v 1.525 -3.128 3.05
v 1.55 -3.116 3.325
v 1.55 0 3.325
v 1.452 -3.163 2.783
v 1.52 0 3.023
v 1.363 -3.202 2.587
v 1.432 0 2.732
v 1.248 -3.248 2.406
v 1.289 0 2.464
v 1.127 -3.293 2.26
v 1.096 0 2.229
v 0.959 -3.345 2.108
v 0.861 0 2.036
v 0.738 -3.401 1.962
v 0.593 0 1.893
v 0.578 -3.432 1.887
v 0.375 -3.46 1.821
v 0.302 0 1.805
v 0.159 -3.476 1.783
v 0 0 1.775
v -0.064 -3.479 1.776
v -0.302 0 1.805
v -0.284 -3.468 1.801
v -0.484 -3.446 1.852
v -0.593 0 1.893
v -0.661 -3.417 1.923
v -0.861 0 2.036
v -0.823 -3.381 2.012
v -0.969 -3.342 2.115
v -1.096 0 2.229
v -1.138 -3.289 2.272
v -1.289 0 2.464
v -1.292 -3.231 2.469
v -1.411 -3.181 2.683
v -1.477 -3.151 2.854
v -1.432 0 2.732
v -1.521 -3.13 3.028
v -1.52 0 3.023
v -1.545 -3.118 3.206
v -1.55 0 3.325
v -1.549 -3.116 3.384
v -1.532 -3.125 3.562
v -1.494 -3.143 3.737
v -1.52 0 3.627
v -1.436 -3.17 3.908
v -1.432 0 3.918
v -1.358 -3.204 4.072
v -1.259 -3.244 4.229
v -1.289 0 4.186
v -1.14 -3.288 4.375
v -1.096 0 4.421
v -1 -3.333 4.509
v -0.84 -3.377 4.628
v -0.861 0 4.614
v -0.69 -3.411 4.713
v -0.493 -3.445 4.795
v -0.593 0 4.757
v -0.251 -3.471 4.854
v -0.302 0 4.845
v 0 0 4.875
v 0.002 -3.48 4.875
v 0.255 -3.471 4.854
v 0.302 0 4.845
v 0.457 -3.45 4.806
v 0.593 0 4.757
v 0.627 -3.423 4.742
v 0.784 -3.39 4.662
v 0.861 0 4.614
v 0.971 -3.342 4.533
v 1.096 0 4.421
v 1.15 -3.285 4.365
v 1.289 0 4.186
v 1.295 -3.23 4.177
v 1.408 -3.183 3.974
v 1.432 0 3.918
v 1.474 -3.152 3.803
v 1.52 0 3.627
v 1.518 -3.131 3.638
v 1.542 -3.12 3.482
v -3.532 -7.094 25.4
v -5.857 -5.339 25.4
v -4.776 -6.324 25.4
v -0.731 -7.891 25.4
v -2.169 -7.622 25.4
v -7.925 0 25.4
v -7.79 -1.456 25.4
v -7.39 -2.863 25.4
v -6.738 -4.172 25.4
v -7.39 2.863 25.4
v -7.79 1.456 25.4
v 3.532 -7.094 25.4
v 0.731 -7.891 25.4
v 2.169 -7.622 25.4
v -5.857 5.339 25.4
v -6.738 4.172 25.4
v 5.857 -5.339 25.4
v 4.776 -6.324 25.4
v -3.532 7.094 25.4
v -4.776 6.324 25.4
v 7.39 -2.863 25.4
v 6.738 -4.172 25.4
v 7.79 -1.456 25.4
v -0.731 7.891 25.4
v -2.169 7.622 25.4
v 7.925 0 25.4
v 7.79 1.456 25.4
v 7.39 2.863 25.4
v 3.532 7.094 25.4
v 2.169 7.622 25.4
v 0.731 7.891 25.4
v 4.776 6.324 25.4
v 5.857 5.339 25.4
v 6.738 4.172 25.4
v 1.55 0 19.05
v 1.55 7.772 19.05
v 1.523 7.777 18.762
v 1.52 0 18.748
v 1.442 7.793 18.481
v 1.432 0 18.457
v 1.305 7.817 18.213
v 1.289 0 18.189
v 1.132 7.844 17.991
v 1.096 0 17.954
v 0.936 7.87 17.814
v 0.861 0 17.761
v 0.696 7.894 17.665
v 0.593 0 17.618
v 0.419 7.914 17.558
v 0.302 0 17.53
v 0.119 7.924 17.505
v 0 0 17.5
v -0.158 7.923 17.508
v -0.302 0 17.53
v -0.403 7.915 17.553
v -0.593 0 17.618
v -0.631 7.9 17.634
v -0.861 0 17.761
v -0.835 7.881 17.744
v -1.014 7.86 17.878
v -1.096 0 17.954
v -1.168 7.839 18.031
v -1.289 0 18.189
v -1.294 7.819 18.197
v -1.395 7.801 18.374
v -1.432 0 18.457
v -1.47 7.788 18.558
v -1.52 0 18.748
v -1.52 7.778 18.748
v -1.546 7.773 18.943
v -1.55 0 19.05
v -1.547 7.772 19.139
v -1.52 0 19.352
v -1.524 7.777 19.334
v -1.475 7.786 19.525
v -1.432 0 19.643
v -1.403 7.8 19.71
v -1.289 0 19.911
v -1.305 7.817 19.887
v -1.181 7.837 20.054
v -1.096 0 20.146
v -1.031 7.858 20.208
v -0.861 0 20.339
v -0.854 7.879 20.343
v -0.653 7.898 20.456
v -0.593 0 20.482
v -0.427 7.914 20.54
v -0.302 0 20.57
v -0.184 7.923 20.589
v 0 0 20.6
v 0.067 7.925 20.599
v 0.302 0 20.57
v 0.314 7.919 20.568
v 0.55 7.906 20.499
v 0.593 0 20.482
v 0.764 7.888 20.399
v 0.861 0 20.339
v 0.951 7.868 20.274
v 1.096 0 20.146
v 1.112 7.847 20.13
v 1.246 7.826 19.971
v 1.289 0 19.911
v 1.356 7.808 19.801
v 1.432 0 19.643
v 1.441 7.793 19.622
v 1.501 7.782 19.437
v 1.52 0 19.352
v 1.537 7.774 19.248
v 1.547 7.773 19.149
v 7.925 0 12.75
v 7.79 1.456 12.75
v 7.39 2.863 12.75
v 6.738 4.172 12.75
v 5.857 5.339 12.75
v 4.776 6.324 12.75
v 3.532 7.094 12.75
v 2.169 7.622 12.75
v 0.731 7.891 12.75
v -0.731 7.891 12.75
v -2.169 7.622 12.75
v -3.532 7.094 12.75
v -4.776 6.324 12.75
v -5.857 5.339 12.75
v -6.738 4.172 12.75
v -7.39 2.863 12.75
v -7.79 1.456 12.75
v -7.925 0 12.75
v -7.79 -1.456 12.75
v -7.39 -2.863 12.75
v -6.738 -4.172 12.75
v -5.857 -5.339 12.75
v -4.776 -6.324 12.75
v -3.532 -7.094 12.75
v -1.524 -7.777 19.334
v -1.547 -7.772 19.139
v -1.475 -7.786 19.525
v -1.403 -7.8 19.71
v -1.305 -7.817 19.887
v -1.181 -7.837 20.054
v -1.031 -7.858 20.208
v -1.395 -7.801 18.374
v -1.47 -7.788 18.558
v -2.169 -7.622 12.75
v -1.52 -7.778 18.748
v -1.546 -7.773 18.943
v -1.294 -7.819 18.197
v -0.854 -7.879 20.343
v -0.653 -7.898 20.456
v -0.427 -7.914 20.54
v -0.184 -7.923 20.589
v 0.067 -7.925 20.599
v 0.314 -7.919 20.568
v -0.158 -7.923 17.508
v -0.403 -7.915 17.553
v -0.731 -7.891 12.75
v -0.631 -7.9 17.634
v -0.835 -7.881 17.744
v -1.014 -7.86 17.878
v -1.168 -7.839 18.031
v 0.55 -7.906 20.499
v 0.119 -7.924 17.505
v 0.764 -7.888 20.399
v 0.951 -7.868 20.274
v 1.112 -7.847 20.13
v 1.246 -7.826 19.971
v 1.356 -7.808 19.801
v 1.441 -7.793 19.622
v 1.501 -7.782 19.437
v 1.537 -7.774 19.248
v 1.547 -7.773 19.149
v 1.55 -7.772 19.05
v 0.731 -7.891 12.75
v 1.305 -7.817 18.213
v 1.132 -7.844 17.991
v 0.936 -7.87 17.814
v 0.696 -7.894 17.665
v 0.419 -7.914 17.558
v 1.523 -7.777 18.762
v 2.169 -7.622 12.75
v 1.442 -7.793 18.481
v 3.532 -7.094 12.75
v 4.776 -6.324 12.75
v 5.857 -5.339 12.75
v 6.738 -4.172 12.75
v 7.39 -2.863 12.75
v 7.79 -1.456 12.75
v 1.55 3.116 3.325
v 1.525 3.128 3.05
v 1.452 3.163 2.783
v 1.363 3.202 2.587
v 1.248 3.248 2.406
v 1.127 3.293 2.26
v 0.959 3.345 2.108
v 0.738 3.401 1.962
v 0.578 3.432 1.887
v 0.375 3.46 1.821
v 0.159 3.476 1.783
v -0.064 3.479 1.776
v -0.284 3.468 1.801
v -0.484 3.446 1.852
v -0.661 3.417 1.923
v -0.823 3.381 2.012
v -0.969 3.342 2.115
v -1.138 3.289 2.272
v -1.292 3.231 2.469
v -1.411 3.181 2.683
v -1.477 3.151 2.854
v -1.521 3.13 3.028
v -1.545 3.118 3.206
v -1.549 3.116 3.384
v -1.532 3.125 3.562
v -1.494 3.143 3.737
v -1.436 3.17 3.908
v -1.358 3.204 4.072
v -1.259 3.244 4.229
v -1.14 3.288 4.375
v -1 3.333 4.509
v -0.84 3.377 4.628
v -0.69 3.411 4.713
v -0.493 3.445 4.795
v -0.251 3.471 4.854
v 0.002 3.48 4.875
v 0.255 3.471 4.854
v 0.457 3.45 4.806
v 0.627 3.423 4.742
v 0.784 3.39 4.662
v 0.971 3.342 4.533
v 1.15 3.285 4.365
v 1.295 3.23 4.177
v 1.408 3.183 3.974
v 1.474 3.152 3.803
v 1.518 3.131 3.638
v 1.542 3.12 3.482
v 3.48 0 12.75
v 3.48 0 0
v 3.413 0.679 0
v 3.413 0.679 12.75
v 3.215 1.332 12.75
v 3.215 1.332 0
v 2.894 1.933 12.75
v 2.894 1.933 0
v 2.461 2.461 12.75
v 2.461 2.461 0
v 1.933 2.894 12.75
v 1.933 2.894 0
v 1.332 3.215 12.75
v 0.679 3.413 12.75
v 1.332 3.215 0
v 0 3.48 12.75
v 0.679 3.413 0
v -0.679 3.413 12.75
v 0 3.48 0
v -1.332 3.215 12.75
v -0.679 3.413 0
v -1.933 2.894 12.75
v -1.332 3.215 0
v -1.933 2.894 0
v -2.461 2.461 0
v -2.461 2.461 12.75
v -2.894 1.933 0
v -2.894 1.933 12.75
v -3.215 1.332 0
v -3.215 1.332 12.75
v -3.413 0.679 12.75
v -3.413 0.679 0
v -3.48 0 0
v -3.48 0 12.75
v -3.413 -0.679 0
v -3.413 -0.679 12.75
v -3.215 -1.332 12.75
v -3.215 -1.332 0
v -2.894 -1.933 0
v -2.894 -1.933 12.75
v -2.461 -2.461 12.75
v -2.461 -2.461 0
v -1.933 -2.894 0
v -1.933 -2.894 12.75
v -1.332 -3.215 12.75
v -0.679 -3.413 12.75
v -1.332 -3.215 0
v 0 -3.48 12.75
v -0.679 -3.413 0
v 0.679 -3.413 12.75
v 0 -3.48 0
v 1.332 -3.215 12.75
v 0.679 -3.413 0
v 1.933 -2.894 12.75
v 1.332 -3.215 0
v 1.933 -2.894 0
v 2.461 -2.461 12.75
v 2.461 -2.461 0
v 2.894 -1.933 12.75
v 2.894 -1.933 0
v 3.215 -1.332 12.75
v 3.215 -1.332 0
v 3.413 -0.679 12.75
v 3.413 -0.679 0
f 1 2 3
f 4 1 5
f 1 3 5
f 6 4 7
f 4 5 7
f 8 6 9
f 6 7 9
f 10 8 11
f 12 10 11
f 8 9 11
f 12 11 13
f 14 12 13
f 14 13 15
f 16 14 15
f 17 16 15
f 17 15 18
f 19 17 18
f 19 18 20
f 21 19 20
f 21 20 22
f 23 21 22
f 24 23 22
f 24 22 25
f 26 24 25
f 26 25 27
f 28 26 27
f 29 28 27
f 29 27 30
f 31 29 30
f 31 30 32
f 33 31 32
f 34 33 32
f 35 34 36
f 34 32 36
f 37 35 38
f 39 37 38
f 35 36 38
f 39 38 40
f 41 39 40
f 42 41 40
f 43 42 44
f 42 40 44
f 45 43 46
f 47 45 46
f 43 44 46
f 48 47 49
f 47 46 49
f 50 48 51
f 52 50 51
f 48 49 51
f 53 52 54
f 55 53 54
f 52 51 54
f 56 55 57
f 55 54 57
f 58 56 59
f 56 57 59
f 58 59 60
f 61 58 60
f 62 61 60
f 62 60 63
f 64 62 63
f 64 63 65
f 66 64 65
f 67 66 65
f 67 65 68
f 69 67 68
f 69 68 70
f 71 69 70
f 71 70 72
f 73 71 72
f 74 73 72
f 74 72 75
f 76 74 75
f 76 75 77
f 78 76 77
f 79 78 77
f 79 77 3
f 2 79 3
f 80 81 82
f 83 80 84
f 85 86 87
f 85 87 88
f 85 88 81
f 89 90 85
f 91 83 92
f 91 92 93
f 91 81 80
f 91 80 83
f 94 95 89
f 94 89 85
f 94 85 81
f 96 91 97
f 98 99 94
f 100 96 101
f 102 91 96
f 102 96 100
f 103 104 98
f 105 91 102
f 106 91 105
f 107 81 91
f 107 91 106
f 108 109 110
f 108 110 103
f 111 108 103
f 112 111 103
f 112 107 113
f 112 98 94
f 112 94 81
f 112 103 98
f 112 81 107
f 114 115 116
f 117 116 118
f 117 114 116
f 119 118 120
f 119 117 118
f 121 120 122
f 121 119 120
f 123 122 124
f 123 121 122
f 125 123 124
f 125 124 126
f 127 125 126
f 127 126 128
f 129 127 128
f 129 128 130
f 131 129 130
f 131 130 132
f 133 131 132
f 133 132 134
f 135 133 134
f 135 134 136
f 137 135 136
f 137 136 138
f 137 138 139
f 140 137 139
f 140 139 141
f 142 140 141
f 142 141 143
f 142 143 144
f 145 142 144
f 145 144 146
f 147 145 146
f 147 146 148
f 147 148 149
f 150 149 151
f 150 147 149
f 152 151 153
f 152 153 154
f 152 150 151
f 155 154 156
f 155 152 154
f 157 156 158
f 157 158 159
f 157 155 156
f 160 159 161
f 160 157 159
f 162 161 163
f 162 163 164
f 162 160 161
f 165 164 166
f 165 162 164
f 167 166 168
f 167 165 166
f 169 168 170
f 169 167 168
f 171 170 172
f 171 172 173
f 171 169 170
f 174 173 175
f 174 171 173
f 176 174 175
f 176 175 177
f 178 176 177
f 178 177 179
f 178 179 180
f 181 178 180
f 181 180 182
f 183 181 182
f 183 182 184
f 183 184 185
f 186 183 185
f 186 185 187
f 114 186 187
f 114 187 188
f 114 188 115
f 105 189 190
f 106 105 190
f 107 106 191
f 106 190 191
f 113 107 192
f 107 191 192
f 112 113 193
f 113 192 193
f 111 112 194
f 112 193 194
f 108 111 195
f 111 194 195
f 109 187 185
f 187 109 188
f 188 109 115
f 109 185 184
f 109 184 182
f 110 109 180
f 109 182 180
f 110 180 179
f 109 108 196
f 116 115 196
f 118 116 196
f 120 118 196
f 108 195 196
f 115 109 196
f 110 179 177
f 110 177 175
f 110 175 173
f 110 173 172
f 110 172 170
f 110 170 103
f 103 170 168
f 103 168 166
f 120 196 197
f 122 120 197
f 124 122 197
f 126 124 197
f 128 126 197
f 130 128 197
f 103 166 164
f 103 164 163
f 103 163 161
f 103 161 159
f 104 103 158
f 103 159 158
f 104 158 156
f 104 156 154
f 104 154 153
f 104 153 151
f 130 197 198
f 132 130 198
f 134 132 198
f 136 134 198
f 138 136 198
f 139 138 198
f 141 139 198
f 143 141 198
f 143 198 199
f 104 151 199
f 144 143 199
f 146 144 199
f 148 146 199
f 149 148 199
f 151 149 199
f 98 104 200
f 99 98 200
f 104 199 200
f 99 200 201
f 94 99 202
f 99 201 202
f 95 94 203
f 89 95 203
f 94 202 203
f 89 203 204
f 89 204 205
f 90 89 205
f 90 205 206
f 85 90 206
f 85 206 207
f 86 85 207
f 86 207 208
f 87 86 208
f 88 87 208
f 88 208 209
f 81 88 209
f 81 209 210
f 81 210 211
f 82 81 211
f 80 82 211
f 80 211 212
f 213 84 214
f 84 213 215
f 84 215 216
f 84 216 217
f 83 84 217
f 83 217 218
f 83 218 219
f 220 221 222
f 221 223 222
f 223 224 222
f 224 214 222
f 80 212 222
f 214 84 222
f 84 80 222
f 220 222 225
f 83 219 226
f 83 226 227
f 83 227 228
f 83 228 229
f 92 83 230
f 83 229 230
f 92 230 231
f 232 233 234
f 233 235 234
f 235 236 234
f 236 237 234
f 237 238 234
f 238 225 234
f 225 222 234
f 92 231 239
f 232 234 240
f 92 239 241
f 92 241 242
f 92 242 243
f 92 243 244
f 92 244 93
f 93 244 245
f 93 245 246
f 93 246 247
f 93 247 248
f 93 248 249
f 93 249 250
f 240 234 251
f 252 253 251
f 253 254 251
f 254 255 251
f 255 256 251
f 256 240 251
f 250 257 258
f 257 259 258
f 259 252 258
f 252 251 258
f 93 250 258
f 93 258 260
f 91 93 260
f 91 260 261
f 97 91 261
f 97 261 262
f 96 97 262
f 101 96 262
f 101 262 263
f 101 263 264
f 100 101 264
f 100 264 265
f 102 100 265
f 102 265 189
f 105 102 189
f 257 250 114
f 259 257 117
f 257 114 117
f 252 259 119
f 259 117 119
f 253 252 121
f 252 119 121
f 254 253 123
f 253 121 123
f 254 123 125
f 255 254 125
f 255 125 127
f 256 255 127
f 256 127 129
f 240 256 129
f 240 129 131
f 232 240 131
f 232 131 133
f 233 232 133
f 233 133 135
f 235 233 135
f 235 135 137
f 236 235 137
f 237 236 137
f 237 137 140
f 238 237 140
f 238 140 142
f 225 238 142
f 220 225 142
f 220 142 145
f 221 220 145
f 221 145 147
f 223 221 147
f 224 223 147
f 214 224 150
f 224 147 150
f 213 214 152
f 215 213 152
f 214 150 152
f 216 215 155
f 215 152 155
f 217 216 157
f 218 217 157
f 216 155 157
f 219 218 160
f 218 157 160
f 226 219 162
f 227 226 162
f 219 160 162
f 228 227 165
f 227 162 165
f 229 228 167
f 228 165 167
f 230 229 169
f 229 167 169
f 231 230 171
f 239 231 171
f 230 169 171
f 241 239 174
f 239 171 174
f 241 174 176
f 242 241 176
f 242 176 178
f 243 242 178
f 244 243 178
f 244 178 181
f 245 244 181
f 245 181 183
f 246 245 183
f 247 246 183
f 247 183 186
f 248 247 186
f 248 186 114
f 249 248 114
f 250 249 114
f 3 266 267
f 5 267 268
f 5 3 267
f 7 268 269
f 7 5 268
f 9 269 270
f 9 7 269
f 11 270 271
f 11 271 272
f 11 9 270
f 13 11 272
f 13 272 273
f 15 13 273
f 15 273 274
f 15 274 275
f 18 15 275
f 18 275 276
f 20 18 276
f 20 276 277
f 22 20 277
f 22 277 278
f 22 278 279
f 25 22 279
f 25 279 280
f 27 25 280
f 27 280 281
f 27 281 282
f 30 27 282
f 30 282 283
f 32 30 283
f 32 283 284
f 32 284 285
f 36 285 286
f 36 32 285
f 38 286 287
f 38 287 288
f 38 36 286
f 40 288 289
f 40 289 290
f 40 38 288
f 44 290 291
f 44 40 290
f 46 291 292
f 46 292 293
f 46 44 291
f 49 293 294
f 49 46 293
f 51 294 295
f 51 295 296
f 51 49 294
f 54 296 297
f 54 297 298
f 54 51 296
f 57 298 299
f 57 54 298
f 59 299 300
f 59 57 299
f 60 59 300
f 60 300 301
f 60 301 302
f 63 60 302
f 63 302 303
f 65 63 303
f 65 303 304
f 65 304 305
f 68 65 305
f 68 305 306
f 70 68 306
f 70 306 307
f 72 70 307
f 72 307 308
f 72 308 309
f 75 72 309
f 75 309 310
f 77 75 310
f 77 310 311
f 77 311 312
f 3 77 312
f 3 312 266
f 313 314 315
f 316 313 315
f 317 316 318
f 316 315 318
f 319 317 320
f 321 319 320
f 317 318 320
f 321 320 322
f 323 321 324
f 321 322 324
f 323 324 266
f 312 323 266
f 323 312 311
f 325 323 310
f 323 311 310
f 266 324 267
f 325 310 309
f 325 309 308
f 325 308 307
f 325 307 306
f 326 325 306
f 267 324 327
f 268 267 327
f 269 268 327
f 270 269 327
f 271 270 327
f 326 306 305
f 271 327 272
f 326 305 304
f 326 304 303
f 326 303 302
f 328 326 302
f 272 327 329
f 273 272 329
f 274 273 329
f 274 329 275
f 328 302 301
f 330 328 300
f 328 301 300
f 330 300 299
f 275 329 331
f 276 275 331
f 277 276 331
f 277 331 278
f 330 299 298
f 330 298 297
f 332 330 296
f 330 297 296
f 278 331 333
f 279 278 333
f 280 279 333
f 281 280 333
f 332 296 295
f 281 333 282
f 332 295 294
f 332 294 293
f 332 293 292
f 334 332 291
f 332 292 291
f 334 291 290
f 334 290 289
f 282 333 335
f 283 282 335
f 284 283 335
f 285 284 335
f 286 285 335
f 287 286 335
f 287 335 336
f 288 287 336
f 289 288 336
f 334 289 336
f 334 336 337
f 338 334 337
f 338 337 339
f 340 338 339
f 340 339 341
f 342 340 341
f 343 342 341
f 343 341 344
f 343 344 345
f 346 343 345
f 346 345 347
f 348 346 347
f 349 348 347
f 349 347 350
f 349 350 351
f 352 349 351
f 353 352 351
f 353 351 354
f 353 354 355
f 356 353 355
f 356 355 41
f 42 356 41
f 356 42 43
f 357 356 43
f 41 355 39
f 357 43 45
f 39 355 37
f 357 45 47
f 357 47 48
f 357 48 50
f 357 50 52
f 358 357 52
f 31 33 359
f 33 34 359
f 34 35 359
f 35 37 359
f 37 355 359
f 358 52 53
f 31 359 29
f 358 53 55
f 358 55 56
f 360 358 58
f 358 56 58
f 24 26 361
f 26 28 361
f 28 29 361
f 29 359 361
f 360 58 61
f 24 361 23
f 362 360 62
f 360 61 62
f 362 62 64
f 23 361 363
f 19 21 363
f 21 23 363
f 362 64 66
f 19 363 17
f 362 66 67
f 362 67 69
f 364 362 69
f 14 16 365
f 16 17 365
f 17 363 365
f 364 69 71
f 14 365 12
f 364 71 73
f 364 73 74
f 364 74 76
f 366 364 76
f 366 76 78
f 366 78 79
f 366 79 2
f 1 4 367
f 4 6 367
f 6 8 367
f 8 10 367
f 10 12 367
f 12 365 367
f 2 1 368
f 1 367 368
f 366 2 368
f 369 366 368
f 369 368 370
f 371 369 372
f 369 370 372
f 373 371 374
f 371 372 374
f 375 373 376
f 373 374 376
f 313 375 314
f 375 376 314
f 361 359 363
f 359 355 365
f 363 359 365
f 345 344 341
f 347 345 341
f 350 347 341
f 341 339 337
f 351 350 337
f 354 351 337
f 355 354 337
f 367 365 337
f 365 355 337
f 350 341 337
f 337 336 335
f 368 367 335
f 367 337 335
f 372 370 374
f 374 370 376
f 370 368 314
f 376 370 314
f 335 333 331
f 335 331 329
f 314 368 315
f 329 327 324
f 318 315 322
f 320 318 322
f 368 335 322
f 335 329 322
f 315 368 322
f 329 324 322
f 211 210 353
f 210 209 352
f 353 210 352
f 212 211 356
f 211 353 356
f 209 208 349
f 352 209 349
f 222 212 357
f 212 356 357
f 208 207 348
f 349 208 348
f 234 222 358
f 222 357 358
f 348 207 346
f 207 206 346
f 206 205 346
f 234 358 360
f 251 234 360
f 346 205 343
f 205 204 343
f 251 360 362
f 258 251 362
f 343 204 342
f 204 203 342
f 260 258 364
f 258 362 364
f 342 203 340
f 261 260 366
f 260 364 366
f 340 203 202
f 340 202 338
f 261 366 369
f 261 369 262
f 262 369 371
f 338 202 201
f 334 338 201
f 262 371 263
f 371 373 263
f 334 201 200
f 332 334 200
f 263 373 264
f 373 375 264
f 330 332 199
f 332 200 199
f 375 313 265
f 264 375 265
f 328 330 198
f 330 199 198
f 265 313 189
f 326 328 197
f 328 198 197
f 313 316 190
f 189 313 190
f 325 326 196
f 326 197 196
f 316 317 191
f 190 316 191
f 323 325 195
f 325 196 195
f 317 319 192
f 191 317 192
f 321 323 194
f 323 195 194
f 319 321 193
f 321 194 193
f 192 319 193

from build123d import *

# Parameters (mm, degrees)
SKETCH1_R               = 7.925
EXTRUDE1_DEPTH          = 25.4
SKETCH2_OUTSIDE_W       = 24.626
SKETCH2_OUTSIDE_H       = 24.626
SKETCH2_OUTSIDE_R       = 3.48
CUT_EXTRUDE1_DEPTH      = 12.75
SKETCH3_R               = 1.55
CUT_EXTRUDE2_DEPTH      = 8.925
CUT_EXTRUDE2_DEPTH_BACK = 8.925
SKETCH4_R               = 1.55
CUT_EXTRUDE3_DEPTH      = 8.925
CUT_EXTRUDE3_DEPTH_BACK = 8.925


with BuildPart() as part:
    # Sketch1 → Extrude1 (new body)
    with BuildSketch(Plane.XY):
        Circle(SKETCH1_R)
    extrude(amount=EXTRUDE1_DEPTH)

    # Sketch2 outside → Cut-Extrude1 (cut)
    with BuildSketch(Plane.XY):
        Rectangle(SKETCH2_OUTSIDE_W, SKETCH2_OUTSIDE_H)
        Circle(SKETCH2_OUTSIDE_R, mode=Mode.SUBTRACT)
    extrude(amount=CUT_EXTRUDE1_DEPTH, mode=Mode.SUBTRACT)

    # Sketch3 → Cut-Extrude2 (cut, two sides)
    with BuildSketch(Plane(origin=(0, 0, 0), x_dir=(1, 0, 0), z_dir=(0, 1, 0))) as cut_extrude2_sk:
        with Locations((0, -3.325)):
            Circle(SKETCH3_R)
    extrude(amount=CUT_EXTRUDE2_DEPTH, mode=Mode.SUBTRACT)
    extrude(cut_extrude2_sk.sketch, amount=-CUT_EXTRUDE2_DEPTH_BACK, mode=Mode.SUBTRACT)

    # Sketch4 → Cut-Extrude3 (cut, two sides)
    with BuildSketch(Plane(origin=(0, 0, 0), x_dir=(1, 0, 0), z_dir=(0, 1, 0))) as cut_extrude3_sk:
        with Locations((0, -19.05)):
            Circle(SKETCH4_R)
    extrude(amount=CUT_EXTRUDE3_DEPTH, mode=Mode.SUBTRACT)
    extrude(cut_extrude3_sk.sketch, amount=-CUT_EXTRUDE3_DEPTH_BACK, mode=Mode.SUBTRACT)


solid = part.part
